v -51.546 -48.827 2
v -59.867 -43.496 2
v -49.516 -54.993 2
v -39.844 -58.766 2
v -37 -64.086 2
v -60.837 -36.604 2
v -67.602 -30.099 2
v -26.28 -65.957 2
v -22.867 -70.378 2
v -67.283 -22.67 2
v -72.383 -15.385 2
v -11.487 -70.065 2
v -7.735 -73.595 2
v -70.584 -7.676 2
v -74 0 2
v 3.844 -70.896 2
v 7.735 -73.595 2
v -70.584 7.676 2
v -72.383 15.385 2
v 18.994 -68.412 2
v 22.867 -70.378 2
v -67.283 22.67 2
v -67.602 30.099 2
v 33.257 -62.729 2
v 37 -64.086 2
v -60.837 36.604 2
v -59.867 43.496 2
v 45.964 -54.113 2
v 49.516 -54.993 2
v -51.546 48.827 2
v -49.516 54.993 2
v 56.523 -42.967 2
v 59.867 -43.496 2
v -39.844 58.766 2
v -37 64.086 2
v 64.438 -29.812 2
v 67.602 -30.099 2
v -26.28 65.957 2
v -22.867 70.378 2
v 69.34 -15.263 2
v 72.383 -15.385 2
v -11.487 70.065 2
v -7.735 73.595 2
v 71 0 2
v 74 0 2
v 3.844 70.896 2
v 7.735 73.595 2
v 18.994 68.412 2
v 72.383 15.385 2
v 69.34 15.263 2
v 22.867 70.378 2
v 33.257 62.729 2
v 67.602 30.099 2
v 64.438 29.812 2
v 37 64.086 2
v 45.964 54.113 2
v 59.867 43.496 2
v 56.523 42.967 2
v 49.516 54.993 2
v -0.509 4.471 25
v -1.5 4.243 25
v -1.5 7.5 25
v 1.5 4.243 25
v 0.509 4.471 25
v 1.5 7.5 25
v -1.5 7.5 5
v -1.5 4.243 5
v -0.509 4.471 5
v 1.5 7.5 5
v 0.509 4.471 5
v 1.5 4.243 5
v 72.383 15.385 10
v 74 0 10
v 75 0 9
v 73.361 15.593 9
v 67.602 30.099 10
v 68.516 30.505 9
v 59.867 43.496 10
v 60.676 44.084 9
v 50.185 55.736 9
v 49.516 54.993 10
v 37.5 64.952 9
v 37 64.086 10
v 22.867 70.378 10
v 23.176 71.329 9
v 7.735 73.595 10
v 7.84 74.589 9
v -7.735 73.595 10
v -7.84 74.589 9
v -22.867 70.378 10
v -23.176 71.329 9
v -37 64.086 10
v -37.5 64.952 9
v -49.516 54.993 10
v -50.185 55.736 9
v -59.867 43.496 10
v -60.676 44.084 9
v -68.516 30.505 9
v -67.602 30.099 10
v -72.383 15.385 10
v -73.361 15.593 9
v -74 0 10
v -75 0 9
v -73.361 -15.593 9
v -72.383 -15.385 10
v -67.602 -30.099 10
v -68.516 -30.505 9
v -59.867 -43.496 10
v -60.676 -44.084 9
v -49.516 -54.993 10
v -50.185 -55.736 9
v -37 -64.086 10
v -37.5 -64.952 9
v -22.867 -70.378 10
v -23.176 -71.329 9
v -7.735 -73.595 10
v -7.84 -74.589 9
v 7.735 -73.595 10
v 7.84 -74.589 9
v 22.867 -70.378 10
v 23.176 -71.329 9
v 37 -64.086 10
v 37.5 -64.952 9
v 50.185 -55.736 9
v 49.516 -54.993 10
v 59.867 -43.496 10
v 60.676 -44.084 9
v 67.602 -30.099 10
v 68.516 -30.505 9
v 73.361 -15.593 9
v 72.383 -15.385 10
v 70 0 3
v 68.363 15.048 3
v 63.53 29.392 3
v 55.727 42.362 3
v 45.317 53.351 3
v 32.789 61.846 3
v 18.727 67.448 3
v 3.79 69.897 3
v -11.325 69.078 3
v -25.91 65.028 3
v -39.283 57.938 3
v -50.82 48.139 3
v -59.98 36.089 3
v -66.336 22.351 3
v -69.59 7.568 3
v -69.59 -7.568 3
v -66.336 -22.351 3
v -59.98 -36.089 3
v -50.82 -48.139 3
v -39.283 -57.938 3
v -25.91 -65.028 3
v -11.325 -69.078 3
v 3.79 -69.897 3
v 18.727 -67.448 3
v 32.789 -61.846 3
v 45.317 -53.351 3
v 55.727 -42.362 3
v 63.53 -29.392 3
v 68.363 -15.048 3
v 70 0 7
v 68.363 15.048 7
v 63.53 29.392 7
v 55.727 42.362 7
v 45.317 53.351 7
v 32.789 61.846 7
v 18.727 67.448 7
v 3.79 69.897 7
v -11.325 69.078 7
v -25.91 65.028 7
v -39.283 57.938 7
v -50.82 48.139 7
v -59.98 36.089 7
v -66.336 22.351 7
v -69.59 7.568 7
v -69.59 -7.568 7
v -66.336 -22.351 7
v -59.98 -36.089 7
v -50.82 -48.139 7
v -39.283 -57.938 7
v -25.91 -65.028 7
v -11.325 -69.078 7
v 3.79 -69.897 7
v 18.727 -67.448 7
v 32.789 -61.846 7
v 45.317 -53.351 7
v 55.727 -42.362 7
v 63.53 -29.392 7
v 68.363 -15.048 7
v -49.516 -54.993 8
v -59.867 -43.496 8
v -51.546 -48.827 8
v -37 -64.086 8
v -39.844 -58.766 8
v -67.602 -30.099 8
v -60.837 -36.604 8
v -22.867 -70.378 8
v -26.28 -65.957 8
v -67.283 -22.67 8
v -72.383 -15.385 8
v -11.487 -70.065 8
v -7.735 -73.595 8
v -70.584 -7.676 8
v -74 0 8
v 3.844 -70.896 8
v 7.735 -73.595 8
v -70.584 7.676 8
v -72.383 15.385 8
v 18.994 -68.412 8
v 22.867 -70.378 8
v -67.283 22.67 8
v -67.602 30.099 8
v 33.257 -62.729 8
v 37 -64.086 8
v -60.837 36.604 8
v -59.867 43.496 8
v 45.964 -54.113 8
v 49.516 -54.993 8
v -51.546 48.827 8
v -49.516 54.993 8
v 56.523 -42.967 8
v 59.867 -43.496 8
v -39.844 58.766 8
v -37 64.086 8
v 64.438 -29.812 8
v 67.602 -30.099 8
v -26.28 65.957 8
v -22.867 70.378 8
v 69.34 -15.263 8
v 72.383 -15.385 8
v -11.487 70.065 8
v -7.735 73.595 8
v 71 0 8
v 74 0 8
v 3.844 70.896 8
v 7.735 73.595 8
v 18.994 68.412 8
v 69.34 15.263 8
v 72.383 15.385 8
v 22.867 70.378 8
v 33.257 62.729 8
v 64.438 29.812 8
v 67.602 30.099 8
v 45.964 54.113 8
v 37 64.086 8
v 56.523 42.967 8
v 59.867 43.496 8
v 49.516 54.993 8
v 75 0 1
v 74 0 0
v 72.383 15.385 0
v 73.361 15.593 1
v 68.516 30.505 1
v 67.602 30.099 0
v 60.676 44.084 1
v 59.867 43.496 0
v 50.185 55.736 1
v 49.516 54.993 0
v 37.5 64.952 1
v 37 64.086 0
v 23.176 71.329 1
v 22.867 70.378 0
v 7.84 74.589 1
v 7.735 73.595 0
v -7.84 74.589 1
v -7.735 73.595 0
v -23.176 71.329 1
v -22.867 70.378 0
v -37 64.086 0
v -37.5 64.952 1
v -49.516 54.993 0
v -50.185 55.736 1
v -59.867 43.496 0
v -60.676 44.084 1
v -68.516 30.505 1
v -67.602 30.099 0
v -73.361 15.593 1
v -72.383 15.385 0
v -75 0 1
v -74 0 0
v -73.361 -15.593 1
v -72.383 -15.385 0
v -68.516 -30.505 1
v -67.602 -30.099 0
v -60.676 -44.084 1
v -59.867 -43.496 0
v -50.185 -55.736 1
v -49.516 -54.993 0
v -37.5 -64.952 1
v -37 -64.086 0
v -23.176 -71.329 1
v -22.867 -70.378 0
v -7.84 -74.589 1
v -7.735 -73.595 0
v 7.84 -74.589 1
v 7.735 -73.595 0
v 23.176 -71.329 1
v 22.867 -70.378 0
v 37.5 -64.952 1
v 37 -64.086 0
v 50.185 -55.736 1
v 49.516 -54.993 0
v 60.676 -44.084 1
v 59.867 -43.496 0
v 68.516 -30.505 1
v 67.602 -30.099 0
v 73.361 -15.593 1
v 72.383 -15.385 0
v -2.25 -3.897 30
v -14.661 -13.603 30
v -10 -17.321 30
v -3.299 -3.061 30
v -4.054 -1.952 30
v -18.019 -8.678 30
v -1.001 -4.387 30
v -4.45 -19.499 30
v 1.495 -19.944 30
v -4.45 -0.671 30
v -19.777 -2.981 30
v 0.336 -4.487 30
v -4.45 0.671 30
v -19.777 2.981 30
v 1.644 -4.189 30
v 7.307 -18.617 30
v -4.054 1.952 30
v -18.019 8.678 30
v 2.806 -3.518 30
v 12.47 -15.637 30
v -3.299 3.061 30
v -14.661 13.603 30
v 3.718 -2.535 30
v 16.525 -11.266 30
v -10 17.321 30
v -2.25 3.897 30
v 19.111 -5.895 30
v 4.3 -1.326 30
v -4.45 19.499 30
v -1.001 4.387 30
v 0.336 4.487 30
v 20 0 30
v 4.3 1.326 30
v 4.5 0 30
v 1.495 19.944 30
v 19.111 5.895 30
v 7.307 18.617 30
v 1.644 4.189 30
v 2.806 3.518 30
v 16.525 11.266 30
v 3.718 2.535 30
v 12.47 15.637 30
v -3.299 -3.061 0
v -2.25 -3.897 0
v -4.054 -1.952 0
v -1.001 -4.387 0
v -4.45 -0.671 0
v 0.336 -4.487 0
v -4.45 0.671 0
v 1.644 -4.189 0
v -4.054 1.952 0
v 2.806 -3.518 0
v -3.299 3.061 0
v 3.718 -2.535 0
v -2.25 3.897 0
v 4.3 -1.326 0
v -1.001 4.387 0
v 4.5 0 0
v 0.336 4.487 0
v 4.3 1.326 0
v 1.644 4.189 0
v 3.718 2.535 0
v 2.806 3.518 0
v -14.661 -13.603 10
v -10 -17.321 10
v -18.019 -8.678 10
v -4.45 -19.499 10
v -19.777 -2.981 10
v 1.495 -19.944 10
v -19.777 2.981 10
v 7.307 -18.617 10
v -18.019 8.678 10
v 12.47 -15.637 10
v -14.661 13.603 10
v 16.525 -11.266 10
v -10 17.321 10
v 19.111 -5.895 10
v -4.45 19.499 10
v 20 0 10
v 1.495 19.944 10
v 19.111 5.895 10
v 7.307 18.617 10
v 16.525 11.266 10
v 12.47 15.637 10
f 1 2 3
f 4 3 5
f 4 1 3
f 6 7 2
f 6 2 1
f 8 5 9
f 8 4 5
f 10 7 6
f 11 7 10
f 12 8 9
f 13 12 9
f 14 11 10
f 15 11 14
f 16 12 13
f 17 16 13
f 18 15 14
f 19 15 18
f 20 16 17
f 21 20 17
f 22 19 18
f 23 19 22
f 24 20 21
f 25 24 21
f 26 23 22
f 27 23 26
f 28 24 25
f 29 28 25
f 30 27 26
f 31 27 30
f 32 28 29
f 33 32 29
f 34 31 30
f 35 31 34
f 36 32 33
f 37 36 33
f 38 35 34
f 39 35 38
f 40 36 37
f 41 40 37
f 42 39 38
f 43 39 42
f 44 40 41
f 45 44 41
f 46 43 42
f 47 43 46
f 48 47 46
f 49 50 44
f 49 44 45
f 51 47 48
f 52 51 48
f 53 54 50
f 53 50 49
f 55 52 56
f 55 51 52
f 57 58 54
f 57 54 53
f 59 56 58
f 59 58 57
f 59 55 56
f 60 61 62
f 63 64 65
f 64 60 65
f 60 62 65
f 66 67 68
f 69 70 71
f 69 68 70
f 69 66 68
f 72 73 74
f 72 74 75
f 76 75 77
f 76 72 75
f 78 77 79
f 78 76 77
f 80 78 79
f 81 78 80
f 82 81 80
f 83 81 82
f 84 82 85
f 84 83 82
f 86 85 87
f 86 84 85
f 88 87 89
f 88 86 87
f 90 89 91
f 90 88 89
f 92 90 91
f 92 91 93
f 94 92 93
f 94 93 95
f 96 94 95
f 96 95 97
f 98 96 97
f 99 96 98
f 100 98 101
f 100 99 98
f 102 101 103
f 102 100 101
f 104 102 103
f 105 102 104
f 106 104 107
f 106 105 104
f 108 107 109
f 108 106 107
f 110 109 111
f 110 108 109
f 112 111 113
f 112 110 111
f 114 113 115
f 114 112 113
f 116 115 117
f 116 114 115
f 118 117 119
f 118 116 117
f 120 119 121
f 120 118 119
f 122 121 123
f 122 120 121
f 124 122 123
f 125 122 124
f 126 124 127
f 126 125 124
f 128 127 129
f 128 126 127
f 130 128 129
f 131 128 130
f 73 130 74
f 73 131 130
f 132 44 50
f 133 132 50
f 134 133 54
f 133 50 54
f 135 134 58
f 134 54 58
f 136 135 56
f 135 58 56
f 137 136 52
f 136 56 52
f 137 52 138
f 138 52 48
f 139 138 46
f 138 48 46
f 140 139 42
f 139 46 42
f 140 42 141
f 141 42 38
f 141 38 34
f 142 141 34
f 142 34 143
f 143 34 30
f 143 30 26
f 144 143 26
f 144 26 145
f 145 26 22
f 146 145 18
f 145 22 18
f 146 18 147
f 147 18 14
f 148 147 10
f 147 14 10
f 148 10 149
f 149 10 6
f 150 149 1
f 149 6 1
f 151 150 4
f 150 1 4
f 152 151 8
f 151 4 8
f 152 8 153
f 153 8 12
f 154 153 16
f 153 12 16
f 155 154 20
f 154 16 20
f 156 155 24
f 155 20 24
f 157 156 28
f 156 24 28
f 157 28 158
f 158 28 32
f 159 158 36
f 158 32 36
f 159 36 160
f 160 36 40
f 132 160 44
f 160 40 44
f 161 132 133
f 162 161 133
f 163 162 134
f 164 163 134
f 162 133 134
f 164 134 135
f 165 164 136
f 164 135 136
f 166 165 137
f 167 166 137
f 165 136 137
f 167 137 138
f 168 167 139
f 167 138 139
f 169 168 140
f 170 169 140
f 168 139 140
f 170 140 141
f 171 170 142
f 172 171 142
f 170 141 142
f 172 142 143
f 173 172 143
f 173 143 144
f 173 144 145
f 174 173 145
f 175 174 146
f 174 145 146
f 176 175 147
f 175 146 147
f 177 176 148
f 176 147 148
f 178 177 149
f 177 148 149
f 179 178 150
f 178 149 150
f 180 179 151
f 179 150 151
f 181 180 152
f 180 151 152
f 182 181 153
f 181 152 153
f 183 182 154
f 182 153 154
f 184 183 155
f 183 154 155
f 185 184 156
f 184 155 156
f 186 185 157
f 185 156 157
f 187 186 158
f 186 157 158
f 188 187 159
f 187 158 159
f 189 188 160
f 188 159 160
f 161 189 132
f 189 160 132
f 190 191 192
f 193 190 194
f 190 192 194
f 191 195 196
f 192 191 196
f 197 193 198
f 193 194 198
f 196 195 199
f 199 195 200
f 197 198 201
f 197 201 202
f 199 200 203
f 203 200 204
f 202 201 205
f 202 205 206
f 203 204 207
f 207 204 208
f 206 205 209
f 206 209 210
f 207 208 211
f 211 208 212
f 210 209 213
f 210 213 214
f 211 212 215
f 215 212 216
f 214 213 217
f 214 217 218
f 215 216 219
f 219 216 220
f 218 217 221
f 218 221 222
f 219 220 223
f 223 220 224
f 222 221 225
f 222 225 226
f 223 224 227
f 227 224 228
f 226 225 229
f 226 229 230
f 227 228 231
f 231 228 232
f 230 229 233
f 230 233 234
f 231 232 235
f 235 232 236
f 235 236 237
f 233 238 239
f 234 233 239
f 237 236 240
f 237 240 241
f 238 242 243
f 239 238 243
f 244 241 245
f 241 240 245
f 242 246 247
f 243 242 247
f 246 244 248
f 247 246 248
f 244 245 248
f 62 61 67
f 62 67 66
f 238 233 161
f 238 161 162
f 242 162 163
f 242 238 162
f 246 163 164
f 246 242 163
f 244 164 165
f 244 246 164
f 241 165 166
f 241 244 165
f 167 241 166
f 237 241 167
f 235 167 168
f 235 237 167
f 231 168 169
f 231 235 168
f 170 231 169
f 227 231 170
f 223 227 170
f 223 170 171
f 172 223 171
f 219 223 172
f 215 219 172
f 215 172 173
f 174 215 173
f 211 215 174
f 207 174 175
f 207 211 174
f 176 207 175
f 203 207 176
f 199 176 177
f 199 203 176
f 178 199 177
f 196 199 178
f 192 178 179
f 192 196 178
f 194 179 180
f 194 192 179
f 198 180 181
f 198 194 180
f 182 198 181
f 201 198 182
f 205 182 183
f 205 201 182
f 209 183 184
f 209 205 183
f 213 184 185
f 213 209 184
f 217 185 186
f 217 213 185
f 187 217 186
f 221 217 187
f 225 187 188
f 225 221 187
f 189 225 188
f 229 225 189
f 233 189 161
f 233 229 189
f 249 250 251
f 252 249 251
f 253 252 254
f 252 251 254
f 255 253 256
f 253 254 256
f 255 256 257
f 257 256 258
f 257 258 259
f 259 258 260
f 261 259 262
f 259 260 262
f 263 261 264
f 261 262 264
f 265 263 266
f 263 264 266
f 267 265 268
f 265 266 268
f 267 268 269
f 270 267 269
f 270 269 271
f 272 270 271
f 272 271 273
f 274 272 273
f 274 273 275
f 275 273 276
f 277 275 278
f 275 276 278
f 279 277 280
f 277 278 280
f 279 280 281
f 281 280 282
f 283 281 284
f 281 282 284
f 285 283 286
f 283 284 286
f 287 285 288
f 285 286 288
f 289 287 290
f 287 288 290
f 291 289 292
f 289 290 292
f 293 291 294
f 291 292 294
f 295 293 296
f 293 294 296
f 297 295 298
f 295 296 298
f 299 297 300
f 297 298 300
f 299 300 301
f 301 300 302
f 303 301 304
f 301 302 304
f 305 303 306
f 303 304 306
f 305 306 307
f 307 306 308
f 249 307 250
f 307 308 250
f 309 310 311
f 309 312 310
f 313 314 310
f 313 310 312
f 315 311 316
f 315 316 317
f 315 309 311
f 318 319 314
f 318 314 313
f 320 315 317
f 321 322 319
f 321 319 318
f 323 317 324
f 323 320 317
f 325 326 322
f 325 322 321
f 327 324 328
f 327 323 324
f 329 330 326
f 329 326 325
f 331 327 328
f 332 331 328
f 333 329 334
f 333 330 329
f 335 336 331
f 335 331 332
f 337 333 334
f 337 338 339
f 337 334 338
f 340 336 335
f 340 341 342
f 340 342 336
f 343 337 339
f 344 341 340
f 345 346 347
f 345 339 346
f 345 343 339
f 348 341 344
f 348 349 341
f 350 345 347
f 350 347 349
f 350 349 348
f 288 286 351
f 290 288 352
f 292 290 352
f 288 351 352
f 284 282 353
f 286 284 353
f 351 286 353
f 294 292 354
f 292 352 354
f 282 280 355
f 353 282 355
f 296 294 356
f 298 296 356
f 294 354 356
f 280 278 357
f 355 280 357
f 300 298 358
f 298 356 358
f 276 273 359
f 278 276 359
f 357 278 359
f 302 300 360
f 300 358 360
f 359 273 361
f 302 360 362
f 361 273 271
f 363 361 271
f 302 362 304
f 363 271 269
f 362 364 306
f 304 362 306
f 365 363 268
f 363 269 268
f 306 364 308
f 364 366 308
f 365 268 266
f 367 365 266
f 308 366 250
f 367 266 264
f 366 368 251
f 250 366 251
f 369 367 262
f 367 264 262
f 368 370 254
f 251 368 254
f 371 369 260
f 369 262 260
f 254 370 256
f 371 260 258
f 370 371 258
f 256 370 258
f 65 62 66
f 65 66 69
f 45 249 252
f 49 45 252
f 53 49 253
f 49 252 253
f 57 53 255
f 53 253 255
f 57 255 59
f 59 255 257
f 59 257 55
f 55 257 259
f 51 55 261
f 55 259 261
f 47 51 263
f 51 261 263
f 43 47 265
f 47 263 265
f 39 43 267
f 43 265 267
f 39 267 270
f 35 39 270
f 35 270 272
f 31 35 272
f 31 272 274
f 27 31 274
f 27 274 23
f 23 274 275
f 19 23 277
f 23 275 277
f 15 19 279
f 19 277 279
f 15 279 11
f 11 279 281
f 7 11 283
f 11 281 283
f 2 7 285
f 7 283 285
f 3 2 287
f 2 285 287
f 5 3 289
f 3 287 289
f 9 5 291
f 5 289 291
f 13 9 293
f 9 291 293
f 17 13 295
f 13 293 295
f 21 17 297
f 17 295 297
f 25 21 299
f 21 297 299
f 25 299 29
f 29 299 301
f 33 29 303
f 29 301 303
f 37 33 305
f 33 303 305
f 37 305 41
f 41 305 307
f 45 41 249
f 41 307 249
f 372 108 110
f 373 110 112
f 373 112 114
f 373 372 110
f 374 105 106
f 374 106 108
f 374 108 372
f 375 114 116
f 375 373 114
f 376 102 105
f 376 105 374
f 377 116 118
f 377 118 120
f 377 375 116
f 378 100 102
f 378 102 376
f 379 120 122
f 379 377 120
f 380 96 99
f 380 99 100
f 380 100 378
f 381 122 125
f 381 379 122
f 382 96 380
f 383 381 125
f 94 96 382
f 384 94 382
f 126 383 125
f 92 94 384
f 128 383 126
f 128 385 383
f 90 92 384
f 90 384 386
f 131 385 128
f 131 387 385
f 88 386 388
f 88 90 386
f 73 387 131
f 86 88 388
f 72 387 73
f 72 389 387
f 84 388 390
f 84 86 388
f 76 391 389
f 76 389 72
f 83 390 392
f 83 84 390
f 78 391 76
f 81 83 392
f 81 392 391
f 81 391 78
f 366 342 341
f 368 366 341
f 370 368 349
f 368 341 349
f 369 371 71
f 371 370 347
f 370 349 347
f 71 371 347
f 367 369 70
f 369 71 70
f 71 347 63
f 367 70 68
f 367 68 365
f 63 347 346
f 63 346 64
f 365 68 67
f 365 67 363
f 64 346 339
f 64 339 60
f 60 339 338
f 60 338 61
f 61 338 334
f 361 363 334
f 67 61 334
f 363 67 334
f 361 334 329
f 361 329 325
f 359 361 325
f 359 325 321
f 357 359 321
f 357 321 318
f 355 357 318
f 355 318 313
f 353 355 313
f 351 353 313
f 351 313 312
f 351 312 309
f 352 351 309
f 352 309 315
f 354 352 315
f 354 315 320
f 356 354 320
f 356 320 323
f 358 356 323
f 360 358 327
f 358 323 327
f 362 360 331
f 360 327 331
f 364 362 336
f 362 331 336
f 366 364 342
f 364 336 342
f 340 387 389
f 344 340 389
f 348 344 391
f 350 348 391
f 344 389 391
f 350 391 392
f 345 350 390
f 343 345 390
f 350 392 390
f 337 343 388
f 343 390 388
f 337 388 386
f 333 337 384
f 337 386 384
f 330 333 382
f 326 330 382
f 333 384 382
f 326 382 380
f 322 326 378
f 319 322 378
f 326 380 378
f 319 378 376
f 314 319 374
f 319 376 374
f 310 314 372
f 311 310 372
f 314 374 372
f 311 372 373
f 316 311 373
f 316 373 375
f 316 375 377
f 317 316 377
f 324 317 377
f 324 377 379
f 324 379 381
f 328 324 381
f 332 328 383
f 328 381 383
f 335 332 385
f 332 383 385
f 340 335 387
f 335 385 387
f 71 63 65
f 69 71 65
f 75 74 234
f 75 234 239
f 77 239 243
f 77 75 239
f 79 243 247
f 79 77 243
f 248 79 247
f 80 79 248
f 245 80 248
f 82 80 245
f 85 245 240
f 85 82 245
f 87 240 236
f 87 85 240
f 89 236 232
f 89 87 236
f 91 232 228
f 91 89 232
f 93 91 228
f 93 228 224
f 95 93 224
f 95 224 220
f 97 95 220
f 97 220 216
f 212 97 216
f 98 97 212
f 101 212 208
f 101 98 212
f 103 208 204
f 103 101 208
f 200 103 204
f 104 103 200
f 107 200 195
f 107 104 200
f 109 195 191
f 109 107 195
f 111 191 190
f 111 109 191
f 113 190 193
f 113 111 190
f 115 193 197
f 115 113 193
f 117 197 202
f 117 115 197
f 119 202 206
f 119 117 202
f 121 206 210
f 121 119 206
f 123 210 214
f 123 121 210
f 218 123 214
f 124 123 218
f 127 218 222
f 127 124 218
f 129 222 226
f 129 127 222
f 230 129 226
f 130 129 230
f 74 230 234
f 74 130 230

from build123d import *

# Parameters (mm, degrees)
SKETCH1_R           = 75
BOSS_EXTRUDE1_DEPTH = 2
SKETCH2_R           = 70
BOSS_EXTRUDE2_DEPTH = 6
SKETCH3_R           = 75
BOSS_EXTRUDE3_DEPTH = 2
CHAMFER1_SIZE       = 1
CHAMFER2_SIZE       = 1
SKETCH4_R           = 20
BOSS_EXTRUDE5_DEPTH = 20
SKETCH5_R           = 4.5
CUT_EXTRUDE1_DEPTH  = 111.227038425
CUT_EXTRUDE2_START  = -5
SKETCH6_W           = 3
SKETCH6_H           = 6
CUT_EXTRUDE2_DEPTH  = 20


with BuildPart() as part:
    # Sketch1 → Boss-Extrude1 (new body)
    with BuildSketch(Plane.XY):
        Circle(SKETCH1_R)
    extrude(amount=BOSS_EXTRUDE1_DEPTH)

    # Sketch2 → Boss-Extrude2 (add)
    with BuildSketch(Plane.XY.offset(2)):
        Circle(SKETCH2_R)
    extrude(amount=BOSS_EXTRUDE2_DEPTH)

    # Sketch3 → Boss-Extrude3 (add)
    with BuildSketch(Plane.XY.offset(8)):
        Circle(SKETCH3_R)
    extrude(amount=BOSS_EXTRUDE3_DEPTH)

    # Chamfer1
    chamfer1_edges = [part.edges().sort_by_distance(p)[0] for p in [
        (-75, 0, 0),
        (-75, 0, 2),
        (-70, 0, 2),
    ]]
    chamfer(chamfer1_edges, length=CHAMFER1_SIZE - 0.0001)  # a hair under: the kernel refuses the full size

    # Chamfer2
    chamfer2_edges = [part.edges().sort_by_distance(p)[0] for p in [
        (-75, 0, 8),
        (-75, 0, 10),
        (-70, 0, 8),
    ]]
    chamfer(chamfer2_edges, length=CHAMFER2_SIZE - 0.0001)  # a hair under: the kernel refuses the full size

    # Sketch4 → Boss-Extrude5 (add)
    with BuildSketch(Plane.XY.offset(10)):
        Circle(SKETCH4_R)
    extrude(amount=BOSS_EXTRUDE5_DEPTH)

    # Sketch5 → Cut-Extrude1 (cut, through all)
    with BuildSketch(Plane.XY.offset(30)):
        Circle(SKETCH5_R)
    extrude(amount=-CUT_EXTRUDE1_DEPTH, mode=Mode.SUBTRACT)

    # Sketch6 → Cut-Extrude2 (cut)
    with BuildSketch(Plane.XY.offset(30).offset(CUT_EXTRUDE2_START)):
        with Locations((0, 4.5)):
            Rectangle(SKETCH6_W, SKETCH6_H)
    extrude(amount=-CUT_EXTRUDE2_DEPTH, mode=Mode.SUBTRACT)


solid = part.part
